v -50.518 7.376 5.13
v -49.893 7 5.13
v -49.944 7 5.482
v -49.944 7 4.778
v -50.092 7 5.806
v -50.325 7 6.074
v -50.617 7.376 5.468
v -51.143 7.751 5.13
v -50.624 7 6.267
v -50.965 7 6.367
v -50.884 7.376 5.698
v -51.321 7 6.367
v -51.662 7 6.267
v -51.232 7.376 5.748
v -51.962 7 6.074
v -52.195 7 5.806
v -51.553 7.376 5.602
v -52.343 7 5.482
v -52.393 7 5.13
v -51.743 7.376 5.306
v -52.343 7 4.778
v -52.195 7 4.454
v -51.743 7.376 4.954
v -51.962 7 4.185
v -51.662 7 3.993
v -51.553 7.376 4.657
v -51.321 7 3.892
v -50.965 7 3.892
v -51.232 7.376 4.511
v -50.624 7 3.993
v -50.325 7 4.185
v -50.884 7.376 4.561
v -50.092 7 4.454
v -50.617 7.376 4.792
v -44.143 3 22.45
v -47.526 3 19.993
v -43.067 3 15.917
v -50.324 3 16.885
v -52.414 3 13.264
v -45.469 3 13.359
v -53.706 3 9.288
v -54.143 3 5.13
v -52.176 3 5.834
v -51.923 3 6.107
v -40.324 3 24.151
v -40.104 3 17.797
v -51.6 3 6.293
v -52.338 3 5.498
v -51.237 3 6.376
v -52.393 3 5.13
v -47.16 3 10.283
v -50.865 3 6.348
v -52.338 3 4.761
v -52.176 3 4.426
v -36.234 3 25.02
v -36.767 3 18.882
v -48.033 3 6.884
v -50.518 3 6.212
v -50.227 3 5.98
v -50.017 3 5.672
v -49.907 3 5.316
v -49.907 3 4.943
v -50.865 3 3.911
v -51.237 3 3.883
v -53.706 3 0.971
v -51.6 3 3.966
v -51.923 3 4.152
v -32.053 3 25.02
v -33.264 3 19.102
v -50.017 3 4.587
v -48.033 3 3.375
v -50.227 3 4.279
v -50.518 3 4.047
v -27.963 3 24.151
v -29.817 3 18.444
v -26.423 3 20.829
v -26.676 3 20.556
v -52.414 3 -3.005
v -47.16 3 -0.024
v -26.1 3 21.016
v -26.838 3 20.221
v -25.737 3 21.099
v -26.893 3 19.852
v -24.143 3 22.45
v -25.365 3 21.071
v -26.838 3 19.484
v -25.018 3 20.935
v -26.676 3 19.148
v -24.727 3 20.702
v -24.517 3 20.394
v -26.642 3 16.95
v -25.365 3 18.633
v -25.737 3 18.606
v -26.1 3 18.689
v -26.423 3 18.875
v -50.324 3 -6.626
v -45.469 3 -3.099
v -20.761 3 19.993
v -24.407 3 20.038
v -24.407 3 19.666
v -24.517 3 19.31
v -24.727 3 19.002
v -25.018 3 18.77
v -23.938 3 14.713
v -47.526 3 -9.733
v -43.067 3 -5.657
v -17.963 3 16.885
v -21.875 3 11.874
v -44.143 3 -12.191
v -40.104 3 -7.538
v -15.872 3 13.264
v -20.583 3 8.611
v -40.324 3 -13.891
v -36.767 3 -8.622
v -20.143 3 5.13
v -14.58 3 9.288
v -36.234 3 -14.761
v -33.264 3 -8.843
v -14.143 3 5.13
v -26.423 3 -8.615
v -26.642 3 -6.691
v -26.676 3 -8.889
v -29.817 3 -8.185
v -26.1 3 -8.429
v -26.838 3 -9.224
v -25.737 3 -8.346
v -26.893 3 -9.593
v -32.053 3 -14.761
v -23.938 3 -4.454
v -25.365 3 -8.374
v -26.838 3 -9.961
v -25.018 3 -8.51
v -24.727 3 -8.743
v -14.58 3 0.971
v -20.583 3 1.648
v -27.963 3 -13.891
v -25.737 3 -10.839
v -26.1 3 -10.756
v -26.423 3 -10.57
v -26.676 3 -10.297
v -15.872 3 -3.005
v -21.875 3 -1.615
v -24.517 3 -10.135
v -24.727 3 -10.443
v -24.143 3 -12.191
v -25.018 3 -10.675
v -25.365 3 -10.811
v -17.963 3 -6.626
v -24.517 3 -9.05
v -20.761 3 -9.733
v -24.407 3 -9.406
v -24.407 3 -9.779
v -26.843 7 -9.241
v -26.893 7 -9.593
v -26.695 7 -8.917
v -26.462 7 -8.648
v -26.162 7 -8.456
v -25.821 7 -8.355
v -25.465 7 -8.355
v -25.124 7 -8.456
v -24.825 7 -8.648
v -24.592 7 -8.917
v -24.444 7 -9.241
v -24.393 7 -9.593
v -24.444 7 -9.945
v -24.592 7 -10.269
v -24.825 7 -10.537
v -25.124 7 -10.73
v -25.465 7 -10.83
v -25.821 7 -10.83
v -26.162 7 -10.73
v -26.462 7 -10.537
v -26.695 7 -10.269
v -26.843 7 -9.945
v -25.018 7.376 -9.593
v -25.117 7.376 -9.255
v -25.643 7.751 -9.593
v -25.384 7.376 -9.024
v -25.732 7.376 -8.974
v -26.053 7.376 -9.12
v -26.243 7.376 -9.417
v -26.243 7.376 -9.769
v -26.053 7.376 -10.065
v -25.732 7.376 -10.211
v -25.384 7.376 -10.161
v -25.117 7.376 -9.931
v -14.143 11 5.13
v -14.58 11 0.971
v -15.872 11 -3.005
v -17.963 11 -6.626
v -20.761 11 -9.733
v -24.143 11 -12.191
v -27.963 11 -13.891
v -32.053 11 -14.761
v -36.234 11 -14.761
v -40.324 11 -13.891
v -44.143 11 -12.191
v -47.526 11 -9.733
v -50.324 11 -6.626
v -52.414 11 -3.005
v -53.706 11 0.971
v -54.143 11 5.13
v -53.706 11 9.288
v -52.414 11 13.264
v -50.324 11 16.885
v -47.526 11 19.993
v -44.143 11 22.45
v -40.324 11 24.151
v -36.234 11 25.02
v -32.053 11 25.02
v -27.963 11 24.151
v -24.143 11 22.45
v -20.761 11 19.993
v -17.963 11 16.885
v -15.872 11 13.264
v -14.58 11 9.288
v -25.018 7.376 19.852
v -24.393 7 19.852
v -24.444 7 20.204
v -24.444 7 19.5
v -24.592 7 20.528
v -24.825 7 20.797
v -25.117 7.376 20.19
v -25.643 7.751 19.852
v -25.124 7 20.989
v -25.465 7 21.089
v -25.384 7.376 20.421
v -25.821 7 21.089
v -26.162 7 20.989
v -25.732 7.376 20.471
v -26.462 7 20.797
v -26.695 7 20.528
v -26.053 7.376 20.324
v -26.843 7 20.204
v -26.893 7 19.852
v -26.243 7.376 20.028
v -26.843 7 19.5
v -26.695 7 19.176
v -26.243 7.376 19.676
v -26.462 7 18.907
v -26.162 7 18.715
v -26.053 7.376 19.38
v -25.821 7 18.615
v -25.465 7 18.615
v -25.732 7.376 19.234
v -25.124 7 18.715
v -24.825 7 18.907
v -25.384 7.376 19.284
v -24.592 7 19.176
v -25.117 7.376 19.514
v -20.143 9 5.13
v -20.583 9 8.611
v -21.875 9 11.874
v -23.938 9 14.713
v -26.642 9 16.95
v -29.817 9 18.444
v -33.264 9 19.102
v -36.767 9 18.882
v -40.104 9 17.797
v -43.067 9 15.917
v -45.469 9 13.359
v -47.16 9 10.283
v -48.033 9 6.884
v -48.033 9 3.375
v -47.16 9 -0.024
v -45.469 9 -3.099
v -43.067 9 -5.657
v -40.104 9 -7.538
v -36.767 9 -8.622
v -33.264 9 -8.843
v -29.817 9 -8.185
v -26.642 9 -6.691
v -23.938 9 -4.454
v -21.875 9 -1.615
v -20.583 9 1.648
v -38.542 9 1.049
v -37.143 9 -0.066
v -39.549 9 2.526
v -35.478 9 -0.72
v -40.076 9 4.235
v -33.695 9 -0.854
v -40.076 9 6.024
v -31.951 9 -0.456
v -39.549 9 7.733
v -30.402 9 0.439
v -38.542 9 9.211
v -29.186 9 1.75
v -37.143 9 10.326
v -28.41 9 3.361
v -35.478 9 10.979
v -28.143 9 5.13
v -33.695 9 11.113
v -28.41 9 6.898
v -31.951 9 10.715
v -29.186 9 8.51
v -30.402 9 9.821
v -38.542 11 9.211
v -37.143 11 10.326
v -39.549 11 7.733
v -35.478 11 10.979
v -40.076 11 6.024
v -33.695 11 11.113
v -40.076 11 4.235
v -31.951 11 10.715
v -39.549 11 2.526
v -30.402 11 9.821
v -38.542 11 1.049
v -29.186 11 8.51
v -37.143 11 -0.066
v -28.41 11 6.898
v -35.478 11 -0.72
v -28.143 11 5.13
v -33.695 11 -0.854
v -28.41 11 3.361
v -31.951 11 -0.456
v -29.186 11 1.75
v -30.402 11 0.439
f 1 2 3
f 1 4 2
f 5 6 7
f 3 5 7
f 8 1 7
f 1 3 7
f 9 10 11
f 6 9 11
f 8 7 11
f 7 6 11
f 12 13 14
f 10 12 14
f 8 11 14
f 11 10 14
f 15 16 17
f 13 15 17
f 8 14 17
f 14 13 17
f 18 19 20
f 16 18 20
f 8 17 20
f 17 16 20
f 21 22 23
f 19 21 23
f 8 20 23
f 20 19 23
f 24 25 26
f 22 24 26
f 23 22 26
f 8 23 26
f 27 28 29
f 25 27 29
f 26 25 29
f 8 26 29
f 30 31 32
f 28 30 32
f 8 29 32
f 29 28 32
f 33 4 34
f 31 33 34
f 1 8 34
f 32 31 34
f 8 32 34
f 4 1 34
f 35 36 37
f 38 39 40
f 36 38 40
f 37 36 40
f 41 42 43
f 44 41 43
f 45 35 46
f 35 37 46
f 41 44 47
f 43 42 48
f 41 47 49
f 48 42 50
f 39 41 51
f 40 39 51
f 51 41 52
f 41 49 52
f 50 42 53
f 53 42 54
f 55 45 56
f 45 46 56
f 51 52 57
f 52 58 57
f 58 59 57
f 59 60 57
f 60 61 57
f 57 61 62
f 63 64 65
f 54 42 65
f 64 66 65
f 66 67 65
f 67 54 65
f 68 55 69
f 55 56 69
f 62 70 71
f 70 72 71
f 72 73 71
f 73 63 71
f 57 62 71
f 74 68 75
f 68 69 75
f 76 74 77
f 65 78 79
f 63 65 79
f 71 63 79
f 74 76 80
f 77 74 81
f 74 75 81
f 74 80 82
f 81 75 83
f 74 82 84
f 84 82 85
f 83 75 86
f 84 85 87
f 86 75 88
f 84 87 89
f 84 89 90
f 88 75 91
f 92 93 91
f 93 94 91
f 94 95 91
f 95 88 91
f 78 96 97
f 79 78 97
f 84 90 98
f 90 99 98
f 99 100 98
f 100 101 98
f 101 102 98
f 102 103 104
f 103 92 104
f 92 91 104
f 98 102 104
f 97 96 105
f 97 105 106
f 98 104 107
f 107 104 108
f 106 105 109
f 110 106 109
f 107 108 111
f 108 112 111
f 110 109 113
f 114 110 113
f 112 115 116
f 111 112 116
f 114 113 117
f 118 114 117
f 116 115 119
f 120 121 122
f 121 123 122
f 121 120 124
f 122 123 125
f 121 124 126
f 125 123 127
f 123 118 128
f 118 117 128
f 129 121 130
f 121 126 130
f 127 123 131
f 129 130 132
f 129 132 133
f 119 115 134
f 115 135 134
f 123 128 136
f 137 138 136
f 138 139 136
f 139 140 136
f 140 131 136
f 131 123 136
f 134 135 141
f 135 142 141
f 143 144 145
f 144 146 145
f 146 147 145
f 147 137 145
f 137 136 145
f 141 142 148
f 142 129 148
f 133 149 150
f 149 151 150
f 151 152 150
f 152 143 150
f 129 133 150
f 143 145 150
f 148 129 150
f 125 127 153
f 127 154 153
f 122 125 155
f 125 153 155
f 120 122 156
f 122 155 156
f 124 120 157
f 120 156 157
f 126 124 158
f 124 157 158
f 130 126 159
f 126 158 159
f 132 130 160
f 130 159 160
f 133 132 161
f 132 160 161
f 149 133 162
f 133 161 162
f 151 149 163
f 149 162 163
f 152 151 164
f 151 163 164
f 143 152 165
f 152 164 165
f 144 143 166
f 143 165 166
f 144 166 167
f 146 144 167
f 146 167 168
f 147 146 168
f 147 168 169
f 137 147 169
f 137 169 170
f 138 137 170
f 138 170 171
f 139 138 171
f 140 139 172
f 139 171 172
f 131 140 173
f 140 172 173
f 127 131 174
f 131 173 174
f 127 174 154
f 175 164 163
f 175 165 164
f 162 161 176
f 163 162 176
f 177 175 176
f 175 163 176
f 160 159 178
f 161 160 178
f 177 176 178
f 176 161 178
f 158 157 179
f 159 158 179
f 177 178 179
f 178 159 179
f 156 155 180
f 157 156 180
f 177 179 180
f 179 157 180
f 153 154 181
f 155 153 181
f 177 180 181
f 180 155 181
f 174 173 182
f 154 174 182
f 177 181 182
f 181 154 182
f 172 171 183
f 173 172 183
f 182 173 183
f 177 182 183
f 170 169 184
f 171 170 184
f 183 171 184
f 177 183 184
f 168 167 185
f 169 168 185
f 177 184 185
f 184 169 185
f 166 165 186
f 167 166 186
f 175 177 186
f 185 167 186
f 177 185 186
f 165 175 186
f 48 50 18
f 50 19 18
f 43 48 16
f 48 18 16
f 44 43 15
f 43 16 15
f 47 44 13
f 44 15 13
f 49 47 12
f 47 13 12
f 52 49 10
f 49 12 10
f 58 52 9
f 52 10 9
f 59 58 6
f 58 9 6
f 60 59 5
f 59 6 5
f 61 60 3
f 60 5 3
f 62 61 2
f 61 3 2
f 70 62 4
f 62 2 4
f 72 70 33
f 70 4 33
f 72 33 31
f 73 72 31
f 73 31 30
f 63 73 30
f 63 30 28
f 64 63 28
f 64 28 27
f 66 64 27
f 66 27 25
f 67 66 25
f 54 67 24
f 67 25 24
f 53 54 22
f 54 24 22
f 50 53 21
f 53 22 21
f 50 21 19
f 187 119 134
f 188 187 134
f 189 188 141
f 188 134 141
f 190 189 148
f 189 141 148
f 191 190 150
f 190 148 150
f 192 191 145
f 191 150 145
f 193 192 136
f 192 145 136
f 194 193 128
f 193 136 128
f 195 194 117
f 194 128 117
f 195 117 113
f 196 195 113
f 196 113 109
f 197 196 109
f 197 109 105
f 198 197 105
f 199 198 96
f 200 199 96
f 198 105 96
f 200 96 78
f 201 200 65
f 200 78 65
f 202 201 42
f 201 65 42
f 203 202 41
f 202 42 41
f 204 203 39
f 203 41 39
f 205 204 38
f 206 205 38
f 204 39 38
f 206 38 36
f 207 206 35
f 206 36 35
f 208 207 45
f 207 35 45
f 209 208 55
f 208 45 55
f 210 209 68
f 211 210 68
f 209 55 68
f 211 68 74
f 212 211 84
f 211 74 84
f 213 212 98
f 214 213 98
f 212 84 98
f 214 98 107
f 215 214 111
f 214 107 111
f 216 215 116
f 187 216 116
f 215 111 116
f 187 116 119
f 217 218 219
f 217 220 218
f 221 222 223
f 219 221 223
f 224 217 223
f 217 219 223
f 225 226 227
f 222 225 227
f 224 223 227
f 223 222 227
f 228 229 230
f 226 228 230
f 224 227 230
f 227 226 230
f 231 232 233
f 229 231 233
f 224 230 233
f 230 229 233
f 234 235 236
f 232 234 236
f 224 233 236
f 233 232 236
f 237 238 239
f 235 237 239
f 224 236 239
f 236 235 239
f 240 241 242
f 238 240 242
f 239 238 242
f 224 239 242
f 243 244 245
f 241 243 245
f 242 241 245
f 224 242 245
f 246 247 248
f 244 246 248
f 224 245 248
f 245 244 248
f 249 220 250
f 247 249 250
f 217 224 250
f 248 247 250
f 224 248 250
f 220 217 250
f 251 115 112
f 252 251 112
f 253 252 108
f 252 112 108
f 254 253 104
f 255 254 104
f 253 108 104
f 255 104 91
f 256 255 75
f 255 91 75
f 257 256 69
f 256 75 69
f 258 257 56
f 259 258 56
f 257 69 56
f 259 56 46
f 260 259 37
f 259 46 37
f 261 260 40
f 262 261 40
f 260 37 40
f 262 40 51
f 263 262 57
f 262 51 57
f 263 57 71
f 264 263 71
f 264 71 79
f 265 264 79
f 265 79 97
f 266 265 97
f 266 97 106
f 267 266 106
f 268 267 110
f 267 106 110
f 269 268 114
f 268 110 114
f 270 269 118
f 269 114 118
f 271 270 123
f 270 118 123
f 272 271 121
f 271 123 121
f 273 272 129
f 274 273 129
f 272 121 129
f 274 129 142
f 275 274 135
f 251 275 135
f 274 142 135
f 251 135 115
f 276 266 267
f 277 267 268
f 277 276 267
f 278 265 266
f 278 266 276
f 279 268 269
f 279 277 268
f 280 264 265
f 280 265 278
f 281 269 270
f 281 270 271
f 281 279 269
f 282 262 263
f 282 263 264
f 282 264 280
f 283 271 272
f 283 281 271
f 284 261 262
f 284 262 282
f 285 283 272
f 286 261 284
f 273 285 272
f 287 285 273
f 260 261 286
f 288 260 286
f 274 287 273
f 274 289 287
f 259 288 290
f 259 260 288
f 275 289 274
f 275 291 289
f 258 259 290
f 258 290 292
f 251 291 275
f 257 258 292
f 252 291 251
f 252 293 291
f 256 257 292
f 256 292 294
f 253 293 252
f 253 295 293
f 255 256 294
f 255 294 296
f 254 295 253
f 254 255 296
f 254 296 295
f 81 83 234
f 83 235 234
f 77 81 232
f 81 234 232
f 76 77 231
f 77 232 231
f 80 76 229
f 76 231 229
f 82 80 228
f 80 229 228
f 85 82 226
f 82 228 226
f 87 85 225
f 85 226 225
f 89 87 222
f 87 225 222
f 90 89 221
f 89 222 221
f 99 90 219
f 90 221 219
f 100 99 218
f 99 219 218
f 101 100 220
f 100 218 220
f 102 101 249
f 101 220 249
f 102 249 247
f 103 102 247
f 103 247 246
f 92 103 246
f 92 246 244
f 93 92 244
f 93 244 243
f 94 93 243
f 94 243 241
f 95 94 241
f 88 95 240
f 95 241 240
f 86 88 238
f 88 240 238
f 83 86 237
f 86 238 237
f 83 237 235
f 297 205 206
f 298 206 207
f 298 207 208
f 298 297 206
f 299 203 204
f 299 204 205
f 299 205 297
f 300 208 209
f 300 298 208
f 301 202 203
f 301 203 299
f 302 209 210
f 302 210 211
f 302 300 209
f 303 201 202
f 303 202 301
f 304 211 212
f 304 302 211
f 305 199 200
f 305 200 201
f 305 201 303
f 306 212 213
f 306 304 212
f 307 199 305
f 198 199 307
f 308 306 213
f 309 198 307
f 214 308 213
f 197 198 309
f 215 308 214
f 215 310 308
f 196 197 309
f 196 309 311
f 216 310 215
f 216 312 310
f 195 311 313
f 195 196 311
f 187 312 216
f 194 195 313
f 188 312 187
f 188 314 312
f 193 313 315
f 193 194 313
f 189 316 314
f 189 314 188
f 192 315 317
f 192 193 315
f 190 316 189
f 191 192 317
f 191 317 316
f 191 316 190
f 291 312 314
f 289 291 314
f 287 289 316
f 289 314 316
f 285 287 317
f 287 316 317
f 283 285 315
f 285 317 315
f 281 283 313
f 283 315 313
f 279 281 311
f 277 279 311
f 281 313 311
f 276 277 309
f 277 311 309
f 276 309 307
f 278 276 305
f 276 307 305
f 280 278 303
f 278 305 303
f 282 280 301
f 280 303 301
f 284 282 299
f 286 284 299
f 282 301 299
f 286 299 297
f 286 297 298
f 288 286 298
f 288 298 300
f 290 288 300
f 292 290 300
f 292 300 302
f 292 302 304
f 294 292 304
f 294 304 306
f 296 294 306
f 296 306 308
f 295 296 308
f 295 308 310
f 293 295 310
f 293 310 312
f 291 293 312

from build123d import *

# Parameters (mm, degrees)
SKETCH1_R                 = 20
BOSS_EXTRUDE1_DEPTH       = 8
SKETCH2_R                 = 14
CUT_EXTRUDE1_DEPTH        = 6
CUT_EXTRUDE4_REACH        = 10
SKETCH3_R                 = 6
M3X0_5_TAPPED_HOLE1_D     = 2.5
M3X0_5_TAPPED_HOLE1_DEPTH = 4
M3X0_5_TAPPED_HOLE1_TIP   = 0.751075774


with BuildPart() as part:
    # Sketch1 → Boss-Extrude1 (new body)
    with BuildSketch(Plane(origin=(0, 3, 0), x_dir=(1, 0, 0), z_dir=(0, 1, 0))):
        with Locations((-34.143225555, -5.12970783)):
            Circle(SKETCH1_R)
    extrude(amount=BOSS_EXTRUDE1_DEPTH)

    # Sketch2 → Cut-Extrude1 (cut)
    with BuildSketch(Plane.XZ.offset(-3)):
        with Locations((-34.143225555, 5.12970783)):
            Circle(SKETCH2_R)
    extrude(amount=-CUT_EXTRUDE1_DEPTH, mode=Mode.SUBTRACT)

    # Sketch3 → Cut-Extrude4 (cut, up to next)
    with BuildSketch(Plane(origin=(0, 11, 0), x_dir=(1, 0, 0), z_dir=(0, 1, 0)), mode=Mode.PRIVATE) as cut_extrude4_sk1:
        with Locations((-34.143225555, -5.12970783)):
            Circle(SKETCH3_R)
    cut_extrude4_tool1 = extrude(cut_extrude4_sk1.sketch, amount=-CUT_EXTRUDE4_REACH, mode=Mode.PRIVATE) & part.part
    add(cut_extrude4_tool1.solids().sort_by_distance((-34.143226, 11, 5.129708))[0], mode=Mode.SUBTRACT)

    # M3x0.5 Tapped Hole1
    with Locations(Plane.XZ.offset(-3)):
        with Locations((-25.643225555, 19.852139695), (-51.143225555, 5.12970783), (-25.643225555, -9.592724034)):
            Hole(M3X0_5_TAPPED_HOLE1_D / 2, depth=M3X0_5_TAPPED_HOLE1_DEPTH)
            with Locations((0, 0, -(M3X0_5_TAPPED_HOLE1_DEPTH + M3X0_5_TAPPED_HOLE1_TIP / 2))):  # 118° drill point
                Cone(0, M3X0_5_TAPPED_HOLE1_D / 2, M3X0_5_TAPPED_HOLE1_TIP, mode=Mode.SUBTRACT)


solid = part.part
